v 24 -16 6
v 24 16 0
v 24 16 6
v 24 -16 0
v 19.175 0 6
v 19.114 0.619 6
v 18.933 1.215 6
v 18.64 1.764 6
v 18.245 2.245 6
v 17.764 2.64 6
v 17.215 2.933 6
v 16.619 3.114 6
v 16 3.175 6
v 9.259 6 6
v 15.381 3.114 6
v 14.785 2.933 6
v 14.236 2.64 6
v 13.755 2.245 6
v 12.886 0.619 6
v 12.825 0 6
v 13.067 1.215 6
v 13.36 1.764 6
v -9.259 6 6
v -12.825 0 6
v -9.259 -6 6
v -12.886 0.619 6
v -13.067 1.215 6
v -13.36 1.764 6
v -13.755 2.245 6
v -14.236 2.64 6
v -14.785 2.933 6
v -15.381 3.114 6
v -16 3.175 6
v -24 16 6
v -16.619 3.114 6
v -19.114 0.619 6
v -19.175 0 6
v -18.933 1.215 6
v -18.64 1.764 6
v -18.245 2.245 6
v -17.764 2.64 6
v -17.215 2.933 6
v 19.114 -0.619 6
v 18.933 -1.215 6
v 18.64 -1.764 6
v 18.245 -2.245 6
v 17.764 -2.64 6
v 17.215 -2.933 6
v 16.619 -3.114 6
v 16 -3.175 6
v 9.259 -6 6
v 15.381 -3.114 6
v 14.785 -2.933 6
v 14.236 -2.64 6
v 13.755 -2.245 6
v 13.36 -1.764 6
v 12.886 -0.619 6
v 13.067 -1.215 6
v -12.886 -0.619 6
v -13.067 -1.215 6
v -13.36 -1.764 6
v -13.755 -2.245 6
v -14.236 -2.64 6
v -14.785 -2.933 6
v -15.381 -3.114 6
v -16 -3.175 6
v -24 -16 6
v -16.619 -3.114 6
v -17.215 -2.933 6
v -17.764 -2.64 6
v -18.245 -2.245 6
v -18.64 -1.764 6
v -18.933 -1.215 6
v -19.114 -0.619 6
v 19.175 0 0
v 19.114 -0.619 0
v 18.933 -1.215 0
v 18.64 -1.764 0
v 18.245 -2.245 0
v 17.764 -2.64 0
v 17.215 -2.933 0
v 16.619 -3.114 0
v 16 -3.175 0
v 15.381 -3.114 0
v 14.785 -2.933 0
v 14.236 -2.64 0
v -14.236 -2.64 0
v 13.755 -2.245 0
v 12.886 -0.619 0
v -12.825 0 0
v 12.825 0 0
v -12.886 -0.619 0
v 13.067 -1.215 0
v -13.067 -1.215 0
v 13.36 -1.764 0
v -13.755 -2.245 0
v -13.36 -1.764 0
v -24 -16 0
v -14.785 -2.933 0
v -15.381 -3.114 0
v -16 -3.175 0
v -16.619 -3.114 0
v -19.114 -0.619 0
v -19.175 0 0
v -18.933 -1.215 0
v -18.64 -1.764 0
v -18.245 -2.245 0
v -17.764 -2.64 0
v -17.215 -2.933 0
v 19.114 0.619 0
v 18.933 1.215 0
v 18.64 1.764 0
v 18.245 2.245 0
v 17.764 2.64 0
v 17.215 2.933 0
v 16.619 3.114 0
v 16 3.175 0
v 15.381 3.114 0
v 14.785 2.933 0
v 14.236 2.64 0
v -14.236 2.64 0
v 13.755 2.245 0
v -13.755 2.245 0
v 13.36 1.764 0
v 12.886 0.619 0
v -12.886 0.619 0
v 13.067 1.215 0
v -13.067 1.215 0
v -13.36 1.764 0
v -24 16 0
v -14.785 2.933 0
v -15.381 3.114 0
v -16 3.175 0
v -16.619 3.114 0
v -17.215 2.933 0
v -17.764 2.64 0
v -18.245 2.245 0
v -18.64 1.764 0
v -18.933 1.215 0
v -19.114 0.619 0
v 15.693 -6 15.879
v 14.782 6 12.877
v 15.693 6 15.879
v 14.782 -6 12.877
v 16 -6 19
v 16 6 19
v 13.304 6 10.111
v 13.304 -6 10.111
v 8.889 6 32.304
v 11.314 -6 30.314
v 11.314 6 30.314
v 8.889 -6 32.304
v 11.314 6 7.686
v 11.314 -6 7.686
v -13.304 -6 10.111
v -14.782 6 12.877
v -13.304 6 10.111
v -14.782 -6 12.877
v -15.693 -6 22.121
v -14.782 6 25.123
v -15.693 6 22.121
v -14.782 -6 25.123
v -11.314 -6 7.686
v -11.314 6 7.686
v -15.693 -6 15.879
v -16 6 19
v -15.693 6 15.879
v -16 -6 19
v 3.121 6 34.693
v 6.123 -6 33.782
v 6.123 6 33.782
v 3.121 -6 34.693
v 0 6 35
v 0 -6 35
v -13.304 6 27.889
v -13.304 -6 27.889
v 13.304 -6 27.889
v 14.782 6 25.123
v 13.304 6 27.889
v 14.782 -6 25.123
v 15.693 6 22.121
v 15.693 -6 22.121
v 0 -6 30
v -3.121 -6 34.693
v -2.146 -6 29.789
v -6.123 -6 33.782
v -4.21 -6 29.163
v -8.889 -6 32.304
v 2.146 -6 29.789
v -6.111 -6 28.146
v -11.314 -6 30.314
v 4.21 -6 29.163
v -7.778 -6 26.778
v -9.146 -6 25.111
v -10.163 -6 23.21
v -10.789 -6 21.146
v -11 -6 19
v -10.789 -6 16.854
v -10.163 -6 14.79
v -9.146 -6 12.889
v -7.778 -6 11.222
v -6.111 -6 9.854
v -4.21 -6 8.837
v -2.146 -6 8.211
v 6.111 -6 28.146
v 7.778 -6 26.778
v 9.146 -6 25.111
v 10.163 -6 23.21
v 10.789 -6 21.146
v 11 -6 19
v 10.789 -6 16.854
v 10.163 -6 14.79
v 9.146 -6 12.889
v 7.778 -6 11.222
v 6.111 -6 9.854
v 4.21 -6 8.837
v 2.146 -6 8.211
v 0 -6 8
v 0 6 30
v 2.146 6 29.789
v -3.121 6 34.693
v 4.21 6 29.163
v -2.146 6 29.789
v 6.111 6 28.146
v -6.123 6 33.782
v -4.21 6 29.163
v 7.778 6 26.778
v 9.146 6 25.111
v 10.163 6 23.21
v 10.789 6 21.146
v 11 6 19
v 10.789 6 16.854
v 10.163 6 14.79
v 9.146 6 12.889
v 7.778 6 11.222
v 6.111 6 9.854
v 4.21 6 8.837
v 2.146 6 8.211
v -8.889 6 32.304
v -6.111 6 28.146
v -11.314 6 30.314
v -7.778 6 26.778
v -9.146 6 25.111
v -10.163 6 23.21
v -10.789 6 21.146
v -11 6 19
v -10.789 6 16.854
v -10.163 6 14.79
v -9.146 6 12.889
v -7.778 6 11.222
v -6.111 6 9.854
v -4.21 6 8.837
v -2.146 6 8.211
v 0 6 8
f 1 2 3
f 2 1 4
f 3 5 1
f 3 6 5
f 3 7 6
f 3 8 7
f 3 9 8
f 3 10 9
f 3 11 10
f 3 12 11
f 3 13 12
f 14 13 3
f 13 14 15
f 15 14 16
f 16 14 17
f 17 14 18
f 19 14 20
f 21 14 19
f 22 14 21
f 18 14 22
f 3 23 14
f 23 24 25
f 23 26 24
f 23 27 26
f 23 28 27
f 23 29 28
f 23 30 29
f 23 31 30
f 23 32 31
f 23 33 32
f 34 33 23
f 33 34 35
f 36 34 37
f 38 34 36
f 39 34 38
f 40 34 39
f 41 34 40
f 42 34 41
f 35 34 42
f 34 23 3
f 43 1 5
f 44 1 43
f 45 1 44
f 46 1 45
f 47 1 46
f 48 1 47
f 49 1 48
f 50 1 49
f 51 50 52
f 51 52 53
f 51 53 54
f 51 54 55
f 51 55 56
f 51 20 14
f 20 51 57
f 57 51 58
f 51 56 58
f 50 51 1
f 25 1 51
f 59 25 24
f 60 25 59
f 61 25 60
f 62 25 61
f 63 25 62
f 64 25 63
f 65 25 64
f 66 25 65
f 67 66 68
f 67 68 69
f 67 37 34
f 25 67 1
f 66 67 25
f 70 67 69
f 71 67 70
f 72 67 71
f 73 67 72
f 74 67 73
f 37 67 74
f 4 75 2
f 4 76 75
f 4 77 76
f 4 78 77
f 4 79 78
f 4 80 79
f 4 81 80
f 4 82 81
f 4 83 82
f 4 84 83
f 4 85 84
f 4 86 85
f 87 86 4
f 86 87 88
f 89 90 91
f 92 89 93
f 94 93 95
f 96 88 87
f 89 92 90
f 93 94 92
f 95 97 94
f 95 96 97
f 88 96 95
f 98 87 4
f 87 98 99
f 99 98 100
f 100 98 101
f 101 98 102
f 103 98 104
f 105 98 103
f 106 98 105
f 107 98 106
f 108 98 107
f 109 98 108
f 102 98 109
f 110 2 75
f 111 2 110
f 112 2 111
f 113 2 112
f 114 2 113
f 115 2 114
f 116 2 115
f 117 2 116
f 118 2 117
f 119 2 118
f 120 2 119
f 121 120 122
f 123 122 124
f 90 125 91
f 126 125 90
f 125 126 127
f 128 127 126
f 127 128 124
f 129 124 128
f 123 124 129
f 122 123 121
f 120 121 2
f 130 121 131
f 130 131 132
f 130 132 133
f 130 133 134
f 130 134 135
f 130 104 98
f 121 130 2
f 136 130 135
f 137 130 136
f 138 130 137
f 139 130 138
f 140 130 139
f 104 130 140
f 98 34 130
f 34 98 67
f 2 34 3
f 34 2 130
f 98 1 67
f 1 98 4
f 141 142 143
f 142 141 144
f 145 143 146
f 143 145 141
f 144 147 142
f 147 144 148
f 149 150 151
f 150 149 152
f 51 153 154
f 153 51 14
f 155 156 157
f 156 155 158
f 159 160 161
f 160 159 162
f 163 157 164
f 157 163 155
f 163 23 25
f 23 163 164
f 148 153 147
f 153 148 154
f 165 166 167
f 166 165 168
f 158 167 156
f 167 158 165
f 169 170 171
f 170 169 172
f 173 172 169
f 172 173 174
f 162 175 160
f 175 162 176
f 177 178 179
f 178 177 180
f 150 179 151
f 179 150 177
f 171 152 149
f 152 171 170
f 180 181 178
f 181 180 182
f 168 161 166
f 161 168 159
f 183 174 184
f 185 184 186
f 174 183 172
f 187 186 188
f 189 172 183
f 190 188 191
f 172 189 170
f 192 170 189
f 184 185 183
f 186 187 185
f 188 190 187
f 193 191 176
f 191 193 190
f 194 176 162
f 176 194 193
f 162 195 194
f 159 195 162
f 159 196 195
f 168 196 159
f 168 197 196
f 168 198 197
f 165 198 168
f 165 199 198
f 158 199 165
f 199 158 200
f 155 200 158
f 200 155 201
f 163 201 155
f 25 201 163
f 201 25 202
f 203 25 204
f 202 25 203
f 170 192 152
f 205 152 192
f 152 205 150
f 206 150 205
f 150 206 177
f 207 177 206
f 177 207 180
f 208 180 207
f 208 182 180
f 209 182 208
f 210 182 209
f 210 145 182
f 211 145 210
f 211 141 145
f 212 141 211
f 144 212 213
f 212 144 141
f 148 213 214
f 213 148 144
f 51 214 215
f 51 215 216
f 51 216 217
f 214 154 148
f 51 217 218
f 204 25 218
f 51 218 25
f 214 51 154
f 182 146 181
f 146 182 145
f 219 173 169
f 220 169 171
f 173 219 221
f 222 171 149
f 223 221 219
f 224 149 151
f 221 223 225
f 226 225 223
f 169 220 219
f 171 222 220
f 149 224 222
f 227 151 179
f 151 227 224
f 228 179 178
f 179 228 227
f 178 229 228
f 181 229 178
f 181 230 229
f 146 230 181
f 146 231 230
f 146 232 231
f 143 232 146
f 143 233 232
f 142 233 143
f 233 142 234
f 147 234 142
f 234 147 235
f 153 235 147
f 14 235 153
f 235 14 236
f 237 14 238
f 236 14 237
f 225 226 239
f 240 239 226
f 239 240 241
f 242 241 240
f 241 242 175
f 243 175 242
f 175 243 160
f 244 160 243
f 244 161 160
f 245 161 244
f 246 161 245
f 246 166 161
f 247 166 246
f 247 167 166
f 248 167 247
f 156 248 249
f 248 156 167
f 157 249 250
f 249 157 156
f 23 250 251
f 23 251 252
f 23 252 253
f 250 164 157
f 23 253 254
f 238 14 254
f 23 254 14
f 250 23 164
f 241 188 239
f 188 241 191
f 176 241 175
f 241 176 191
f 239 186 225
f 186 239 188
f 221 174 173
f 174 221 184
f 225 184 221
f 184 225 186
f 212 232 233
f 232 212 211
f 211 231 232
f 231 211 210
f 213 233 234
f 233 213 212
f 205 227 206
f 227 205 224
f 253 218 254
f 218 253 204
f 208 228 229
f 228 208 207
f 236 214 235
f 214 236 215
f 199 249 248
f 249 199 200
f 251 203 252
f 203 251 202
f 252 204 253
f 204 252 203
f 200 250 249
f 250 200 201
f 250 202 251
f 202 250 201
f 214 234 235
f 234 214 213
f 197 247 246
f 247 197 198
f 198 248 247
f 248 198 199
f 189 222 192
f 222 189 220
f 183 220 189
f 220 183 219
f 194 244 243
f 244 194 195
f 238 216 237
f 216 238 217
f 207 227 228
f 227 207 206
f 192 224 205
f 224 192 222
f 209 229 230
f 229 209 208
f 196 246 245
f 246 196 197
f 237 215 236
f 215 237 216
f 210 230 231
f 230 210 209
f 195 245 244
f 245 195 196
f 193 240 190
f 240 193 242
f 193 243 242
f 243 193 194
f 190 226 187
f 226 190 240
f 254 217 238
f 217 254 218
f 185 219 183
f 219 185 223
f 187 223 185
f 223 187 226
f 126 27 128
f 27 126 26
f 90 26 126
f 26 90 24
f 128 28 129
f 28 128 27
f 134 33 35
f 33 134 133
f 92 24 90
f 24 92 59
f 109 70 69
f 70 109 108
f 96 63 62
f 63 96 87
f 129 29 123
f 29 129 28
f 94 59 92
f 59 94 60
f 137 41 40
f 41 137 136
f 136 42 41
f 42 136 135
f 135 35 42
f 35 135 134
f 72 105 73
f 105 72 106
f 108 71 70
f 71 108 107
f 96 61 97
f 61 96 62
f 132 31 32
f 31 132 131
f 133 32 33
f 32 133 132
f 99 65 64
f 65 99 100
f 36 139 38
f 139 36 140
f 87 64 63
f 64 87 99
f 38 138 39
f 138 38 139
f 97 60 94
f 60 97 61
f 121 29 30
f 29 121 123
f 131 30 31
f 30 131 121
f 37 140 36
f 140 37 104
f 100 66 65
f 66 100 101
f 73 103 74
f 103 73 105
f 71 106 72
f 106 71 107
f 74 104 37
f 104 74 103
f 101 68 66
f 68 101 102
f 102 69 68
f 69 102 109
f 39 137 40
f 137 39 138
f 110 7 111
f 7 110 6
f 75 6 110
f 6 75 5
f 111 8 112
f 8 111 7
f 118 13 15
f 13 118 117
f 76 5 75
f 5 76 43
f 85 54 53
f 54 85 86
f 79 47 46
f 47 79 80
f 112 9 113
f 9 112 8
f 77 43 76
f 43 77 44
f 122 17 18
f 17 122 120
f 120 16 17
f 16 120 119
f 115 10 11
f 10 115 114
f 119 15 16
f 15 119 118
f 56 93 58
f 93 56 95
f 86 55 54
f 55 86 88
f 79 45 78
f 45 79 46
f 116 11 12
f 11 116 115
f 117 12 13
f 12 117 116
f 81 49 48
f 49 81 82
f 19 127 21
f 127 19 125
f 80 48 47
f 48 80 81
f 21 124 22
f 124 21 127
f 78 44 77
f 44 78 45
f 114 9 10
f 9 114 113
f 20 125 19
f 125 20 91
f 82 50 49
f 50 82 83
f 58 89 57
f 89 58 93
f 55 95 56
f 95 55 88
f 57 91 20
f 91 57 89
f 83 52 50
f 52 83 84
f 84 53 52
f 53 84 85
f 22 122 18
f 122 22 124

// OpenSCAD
$fn = 32;

// ----------------------------------------------------------------------
// Deck eye: 32 mm eye on a 48 mm base
// ----------------------------------------------------------------------

// --- parameters (mm) ---
base_l = 48;              // base length
base_w = 32;              // base width
base_t = 6;               // base thickness
eye_r = 16;               // eye outside radius
eye_bore = 22;            // eye bore diameter
eye_w = 12;               // eye thickness
eye_z = 19;               // eye centre height
holes_d = 6.35;           // fixing holes
hole_x = 16;              // fixing hole spacing

difference() {
  union() {
    translate([-24, -16, 0]) cube([base_l, base_w, base_t]);
    /* eye standing upright, its foot sunk 3 mm into the base */
    translate([0, -6, 19]) rotate([-90, 0, 0]) cylinder(h = 12, d = 32);
  }
  /* eye bore, 2.5 mm clear of both faces */
  translate([0, -8.5, 19]) rotate([-90, 0, 0]) cylinder(h = 17, d = 22);
  translate([-16, 0, -2.5]) cylinder(h = base_t + 5, d = holes_d);
  translate([16, 0, -2.5]) cylinder(h = base_t + 5, d = holes_d);
}
